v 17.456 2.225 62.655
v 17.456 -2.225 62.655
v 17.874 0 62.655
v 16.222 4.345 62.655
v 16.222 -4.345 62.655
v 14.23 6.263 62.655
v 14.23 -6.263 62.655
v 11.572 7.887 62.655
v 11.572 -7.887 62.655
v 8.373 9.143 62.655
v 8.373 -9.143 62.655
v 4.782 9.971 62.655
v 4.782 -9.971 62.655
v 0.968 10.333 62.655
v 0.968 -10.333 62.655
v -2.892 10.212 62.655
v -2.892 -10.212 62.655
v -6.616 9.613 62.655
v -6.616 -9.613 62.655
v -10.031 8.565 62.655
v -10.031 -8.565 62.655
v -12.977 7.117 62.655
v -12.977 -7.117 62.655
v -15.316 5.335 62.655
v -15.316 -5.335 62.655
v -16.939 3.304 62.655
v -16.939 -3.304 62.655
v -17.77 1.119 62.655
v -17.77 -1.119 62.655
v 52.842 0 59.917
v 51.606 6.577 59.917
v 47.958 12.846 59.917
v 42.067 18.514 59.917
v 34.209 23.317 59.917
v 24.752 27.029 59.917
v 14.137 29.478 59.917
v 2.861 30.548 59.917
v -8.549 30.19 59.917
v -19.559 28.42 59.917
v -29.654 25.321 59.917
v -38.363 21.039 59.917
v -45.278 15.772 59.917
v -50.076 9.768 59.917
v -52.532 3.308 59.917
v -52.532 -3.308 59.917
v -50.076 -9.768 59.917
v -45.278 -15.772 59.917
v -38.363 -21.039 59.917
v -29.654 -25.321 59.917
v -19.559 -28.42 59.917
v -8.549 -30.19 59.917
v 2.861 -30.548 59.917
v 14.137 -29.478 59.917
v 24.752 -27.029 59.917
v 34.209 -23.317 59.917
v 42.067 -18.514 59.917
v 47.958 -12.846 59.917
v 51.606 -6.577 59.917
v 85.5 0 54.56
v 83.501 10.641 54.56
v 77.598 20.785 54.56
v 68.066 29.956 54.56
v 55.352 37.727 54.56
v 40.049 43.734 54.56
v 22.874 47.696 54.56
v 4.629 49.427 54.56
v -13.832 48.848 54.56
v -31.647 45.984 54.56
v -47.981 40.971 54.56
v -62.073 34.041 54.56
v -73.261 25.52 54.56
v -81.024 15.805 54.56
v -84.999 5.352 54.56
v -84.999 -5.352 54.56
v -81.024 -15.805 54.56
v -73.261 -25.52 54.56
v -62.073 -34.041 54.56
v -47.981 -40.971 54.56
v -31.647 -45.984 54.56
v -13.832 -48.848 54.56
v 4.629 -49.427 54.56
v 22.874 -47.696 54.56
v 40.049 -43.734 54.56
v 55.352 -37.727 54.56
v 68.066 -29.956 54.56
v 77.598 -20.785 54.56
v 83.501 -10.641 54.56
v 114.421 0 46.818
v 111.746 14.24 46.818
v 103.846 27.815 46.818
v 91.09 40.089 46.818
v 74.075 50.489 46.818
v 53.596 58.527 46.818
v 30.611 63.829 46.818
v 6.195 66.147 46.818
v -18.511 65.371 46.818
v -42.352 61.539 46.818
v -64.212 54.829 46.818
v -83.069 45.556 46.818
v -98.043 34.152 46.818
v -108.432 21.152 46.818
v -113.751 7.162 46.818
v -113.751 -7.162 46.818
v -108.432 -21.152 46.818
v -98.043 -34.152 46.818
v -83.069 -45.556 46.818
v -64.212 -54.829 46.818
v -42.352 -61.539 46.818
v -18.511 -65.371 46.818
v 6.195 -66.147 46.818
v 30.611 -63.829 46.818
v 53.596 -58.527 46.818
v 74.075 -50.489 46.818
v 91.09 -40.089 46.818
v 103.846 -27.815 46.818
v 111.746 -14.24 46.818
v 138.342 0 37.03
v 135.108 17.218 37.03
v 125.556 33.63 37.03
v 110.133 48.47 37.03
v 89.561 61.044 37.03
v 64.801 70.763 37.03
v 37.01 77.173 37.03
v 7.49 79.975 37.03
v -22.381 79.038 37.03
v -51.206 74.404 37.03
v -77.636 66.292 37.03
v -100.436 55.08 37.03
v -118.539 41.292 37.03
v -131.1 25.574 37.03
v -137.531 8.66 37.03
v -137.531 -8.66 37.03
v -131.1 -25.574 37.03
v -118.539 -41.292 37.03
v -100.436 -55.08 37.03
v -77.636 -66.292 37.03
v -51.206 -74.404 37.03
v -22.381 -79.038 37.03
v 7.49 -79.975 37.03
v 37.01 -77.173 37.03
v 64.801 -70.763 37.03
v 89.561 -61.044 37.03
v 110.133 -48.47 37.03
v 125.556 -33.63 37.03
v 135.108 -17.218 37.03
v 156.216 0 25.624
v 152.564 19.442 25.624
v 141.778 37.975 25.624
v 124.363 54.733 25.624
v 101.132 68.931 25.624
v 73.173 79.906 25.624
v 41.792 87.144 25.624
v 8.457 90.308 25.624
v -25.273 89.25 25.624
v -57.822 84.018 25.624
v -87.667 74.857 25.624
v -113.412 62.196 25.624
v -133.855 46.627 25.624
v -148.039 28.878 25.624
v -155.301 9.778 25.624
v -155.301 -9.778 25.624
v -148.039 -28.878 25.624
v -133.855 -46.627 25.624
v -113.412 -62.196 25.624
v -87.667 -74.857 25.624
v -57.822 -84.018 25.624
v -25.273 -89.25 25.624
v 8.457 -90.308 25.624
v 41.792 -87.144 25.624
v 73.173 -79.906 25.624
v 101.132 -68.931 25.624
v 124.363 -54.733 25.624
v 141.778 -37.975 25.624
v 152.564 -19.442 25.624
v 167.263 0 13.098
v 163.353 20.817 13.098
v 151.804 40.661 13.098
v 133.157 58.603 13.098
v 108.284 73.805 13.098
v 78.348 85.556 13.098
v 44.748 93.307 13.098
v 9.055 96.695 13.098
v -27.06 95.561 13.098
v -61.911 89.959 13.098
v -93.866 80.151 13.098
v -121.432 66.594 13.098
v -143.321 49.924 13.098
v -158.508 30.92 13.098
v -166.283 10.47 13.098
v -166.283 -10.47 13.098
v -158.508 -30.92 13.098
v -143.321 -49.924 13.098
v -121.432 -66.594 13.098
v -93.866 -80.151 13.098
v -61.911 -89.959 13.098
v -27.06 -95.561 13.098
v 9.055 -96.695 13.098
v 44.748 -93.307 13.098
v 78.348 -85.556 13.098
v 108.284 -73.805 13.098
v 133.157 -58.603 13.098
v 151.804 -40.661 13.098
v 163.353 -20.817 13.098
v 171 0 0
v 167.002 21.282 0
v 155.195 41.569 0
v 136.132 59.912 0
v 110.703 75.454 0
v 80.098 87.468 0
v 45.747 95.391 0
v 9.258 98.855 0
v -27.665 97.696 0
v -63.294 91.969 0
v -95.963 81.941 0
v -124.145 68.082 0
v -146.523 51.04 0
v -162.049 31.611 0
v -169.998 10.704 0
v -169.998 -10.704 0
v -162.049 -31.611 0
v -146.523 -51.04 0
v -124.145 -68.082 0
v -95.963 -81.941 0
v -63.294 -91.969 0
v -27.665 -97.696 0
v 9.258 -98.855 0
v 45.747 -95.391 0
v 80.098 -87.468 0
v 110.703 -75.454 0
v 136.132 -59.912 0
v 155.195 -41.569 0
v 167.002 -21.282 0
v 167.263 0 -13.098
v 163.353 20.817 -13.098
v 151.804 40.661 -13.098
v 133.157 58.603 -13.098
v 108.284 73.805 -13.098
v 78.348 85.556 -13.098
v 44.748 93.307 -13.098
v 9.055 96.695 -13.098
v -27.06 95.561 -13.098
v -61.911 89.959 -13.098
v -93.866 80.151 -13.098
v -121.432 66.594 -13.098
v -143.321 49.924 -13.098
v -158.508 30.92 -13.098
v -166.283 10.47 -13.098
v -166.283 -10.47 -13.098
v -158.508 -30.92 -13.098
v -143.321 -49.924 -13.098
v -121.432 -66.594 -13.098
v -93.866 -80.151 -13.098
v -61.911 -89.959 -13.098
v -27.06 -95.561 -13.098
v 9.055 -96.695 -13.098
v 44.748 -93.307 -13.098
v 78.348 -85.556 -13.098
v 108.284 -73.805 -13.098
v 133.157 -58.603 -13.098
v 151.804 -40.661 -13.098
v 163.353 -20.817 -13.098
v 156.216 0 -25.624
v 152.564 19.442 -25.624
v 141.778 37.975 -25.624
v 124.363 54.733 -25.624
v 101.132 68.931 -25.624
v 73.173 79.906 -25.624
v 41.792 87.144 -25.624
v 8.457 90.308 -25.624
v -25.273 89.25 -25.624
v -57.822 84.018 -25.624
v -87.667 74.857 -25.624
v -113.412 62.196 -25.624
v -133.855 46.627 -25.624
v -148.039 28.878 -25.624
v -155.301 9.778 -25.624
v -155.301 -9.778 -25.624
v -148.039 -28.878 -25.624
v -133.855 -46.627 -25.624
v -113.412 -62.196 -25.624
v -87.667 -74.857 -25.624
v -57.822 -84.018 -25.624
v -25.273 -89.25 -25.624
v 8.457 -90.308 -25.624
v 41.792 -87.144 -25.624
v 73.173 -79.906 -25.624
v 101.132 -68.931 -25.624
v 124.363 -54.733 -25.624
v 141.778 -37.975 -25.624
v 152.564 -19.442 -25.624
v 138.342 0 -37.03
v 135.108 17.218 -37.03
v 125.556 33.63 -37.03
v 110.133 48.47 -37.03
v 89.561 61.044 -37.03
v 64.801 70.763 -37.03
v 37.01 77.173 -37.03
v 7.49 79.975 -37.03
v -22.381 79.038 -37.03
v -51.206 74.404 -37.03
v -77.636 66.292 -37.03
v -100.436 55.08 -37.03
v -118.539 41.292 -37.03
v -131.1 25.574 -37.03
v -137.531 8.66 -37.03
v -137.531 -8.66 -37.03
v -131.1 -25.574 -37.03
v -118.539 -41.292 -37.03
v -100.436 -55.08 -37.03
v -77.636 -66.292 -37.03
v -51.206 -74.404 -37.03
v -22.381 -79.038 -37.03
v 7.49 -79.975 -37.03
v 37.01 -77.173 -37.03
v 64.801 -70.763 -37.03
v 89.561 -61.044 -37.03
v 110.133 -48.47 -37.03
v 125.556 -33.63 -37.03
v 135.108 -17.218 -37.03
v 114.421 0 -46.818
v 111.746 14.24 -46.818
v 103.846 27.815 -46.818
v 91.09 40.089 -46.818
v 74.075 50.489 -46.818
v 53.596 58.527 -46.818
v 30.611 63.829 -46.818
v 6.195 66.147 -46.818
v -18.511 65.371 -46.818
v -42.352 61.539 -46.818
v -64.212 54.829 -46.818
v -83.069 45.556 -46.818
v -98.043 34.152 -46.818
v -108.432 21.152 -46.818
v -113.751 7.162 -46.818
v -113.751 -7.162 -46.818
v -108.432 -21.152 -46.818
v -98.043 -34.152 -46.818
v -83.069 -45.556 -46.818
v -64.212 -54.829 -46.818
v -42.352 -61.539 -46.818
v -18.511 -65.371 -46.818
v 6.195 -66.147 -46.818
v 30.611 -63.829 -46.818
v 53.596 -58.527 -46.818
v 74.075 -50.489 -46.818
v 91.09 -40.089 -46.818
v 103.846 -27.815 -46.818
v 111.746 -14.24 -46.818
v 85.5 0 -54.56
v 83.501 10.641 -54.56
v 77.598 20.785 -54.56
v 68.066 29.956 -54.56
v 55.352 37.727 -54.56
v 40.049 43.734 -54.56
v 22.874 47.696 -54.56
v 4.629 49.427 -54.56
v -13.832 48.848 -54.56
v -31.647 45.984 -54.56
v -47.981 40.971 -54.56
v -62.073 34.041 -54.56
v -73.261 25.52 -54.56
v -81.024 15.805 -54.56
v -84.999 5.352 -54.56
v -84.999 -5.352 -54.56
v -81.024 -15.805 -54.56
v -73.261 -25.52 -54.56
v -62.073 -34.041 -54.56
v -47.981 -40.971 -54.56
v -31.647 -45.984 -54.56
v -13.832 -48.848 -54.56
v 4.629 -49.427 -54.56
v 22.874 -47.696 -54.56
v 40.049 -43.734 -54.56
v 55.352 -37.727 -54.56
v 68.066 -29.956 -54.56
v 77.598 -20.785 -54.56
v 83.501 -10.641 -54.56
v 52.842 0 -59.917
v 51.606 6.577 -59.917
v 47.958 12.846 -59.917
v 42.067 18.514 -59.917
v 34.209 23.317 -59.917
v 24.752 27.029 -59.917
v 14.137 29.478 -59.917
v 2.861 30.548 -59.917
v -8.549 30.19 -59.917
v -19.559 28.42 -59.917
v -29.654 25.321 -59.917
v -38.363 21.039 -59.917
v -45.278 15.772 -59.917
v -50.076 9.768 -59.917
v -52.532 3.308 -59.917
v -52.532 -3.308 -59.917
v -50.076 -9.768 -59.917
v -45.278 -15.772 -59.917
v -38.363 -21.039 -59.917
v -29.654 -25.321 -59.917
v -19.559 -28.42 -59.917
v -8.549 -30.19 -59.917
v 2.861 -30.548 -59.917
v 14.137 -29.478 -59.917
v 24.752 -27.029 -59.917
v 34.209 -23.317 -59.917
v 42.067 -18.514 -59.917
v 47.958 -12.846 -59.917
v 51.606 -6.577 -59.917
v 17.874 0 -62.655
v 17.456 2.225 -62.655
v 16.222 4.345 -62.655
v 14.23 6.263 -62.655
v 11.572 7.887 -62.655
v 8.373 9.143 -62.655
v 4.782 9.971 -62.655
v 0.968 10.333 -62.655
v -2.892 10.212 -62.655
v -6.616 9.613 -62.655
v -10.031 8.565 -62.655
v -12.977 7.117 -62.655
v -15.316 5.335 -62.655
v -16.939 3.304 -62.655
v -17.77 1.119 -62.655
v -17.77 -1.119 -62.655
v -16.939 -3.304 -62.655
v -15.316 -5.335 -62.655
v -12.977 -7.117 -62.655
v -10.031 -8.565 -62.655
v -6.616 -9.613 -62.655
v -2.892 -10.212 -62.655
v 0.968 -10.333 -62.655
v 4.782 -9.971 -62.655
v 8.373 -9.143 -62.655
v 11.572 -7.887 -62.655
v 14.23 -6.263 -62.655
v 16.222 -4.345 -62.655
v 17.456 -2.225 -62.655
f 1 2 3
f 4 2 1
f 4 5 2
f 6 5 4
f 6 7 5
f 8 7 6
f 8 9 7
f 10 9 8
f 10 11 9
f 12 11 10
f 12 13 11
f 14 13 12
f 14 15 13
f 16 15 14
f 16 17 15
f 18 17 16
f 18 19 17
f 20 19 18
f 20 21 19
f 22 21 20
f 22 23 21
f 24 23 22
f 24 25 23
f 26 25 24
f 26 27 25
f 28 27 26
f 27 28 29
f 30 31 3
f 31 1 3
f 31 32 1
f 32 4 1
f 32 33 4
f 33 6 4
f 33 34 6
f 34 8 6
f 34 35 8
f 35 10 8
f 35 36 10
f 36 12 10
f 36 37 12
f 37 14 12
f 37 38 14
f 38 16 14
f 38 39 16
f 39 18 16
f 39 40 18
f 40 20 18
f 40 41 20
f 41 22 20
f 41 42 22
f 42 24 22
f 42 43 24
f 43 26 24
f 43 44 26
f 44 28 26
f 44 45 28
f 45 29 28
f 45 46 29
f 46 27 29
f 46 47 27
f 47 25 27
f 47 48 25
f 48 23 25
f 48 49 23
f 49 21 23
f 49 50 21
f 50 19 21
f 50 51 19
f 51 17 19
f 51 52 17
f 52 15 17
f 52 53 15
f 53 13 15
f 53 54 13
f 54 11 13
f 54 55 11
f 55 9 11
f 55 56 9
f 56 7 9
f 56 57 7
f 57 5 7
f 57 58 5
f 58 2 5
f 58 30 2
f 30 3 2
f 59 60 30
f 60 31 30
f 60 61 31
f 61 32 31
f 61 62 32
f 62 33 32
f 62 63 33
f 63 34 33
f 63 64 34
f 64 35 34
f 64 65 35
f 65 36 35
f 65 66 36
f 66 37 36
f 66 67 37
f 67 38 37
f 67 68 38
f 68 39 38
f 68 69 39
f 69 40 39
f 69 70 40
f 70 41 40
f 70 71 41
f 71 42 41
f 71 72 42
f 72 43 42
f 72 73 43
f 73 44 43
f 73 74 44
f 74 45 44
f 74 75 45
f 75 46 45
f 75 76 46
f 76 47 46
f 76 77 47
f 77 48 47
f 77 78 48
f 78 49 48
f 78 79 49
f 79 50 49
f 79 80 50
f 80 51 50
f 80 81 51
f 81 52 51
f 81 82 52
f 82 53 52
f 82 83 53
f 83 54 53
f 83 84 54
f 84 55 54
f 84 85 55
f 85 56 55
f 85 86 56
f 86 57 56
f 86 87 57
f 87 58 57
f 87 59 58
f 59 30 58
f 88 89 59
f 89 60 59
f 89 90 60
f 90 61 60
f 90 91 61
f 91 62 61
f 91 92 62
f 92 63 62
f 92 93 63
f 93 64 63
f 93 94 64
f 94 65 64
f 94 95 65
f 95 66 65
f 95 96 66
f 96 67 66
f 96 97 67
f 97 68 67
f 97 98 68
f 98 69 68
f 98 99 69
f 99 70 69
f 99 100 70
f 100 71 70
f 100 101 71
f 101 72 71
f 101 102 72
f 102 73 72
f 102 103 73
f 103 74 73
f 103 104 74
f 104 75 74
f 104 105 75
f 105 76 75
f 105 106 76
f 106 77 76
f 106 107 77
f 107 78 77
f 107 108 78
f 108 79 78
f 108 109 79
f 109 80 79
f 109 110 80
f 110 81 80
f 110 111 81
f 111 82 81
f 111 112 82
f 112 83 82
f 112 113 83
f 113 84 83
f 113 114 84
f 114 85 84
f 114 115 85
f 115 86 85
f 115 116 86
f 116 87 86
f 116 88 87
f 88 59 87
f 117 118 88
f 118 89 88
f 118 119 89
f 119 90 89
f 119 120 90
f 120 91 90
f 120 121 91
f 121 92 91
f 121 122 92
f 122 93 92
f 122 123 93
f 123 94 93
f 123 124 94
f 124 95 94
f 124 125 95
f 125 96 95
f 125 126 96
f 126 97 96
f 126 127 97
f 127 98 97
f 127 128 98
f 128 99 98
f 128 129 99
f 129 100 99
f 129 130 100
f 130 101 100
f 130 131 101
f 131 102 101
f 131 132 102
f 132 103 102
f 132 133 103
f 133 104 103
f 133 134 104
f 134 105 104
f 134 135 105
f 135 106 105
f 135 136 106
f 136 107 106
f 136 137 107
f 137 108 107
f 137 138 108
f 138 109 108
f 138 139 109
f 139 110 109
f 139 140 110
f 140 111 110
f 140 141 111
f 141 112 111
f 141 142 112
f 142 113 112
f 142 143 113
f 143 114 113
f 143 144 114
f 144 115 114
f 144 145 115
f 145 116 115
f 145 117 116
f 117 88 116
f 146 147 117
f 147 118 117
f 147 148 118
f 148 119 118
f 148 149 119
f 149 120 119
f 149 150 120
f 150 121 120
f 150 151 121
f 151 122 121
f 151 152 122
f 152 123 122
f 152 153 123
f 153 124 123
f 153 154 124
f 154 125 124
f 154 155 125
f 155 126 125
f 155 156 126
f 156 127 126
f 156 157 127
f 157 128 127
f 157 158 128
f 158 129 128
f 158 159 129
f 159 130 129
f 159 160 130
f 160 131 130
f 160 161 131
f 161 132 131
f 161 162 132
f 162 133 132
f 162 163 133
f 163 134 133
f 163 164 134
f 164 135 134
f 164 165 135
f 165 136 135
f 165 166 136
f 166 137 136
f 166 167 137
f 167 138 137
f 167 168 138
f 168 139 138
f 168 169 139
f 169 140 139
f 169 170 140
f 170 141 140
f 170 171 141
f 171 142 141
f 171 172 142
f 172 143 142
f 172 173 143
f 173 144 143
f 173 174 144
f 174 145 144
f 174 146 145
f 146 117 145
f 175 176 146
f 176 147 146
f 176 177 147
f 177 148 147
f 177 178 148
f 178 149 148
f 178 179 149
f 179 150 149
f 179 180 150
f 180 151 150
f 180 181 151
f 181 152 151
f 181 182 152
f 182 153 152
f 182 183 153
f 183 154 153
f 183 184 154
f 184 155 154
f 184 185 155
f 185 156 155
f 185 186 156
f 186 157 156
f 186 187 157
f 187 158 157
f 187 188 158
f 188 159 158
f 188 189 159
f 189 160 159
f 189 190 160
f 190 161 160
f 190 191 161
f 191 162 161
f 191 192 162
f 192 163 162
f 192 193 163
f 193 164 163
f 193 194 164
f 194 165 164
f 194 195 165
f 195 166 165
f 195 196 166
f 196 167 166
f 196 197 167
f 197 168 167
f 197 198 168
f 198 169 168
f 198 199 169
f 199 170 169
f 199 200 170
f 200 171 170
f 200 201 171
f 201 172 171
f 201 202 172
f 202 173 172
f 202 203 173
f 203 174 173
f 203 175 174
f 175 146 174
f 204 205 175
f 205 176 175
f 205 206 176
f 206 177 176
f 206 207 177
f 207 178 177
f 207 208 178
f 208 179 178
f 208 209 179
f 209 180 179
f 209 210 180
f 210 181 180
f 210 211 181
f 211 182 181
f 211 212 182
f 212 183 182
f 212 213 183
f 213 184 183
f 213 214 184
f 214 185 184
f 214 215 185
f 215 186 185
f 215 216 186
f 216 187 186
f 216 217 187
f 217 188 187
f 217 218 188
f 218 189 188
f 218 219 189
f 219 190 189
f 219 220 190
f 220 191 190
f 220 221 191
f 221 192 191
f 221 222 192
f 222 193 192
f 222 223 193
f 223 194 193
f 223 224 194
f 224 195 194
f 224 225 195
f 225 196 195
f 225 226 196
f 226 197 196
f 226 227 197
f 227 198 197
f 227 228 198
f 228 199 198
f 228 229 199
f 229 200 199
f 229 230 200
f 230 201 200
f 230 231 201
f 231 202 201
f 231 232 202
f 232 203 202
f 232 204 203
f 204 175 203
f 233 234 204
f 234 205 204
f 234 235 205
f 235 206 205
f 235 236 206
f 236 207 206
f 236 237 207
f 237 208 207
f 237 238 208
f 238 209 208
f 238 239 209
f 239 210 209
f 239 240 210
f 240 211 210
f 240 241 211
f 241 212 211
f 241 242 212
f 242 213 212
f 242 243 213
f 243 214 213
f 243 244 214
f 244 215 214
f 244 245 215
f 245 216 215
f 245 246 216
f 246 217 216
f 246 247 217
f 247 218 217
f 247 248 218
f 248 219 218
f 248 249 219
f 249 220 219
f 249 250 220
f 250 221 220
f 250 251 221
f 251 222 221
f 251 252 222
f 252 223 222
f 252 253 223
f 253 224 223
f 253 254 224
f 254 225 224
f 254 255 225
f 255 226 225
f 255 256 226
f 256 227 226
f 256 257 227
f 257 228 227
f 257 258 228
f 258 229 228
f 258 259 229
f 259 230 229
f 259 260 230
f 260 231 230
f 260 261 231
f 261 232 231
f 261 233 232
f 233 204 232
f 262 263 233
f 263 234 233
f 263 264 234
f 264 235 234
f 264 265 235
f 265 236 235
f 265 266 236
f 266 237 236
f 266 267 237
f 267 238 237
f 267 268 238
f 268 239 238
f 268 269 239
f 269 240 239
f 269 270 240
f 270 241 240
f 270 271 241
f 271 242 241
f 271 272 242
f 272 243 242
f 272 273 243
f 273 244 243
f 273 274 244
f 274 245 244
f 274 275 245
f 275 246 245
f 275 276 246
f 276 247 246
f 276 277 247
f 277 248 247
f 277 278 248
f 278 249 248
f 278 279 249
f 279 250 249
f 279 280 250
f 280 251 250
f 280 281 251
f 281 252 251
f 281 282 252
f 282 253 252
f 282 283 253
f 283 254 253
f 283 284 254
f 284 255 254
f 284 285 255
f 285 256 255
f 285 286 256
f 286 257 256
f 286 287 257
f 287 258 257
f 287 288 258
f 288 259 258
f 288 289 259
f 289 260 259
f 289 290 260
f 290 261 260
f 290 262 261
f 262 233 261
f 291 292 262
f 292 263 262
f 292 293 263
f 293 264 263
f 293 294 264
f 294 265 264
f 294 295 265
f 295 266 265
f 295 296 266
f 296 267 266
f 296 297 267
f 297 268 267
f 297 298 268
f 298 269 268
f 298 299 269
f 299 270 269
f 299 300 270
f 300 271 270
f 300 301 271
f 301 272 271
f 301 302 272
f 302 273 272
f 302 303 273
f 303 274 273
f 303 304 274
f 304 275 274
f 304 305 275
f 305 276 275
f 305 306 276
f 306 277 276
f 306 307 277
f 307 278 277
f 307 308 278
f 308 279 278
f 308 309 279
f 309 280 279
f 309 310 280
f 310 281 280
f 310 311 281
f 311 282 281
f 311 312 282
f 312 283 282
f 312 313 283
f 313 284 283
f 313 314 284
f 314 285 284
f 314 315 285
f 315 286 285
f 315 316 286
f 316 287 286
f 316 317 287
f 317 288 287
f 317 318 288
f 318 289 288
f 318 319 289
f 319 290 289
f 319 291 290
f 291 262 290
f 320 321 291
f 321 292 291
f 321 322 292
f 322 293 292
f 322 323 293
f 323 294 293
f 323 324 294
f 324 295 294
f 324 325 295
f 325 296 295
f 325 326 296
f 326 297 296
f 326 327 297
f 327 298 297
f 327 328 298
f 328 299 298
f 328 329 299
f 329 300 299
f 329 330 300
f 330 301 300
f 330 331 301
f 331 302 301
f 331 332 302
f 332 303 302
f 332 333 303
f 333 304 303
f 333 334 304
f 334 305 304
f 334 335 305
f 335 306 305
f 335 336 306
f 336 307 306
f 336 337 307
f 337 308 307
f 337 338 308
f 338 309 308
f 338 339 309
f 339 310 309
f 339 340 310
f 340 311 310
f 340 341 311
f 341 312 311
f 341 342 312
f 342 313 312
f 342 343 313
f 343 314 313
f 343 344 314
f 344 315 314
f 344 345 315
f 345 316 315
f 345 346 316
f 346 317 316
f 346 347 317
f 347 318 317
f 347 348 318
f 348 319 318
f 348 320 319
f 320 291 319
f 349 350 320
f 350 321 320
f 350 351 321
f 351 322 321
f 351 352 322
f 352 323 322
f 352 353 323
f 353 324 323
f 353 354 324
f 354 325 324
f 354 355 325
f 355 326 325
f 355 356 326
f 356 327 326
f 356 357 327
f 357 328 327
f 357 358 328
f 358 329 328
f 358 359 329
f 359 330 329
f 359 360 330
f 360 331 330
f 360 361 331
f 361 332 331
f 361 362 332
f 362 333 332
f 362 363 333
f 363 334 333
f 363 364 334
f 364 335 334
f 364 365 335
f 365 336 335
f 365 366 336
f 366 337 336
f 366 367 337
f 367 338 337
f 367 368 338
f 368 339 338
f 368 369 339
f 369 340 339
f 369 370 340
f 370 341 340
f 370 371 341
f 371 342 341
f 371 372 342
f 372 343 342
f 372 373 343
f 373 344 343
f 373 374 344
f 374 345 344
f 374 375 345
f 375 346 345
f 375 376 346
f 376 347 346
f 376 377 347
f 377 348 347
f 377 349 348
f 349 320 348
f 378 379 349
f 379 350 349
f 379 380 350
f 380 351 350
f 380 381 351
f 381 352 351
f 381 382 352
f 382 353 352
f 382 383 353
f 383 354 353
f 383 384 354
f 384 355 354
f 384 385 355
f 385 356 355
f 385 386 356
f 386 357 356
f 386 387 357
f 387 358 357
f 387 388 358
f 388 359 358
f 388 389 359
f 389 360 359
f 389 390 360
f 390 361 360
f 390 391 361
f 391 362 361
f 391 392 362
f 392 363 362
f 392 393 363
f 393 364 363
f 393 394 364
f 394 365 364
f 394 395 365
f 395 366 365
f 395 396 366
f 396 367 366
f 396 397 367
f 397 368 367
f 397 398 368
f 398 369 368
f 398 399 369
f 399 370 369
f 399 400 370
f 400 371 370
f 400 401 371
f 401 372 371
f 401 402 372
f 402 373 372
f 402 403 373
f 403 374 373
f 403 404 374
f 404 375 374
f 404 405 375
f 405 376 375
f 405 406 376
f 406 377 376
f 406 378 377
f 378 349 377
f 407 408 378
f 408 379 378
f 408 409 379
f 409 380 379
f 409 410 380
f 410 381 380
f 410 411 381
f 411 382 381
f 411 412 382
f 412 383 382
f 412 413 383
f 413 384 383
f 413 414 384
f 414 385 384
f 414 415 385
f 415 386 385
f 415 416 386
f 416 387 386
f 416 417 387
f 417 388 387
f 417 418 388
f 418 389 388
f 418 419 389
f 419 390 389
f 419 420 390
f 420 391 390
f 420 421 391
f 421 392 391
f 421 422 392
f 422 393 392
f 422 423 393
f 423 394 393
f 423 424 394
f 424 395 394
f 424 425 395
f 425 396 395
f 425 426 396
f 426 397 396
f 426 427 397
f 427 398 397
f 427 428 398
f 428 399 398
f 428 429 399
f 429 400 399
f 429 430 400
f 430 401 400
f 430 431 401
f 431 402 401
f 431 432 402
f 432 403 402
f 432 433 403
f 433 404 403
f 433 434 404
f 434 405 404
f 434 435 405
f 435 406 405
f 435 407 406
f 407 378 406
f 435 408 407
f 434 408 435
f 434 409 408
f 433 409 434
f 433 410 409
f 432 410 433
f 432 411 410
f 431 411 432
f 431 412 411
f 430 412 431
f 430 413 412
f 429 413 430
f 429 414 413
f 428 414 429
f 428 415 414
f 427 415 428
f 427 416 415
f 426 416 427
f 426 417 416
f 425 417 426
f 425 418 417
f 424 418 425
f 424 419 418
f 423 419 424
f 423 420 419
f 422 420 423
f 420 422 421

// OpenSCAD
// Generated by SolidPython 1.0.1 on 2020-07-29 00:46:54


scale(v = [19, 11, 7]) {
	sphere(r = 9);
}
/***********************************************
*********      SolidPython code:      **********
************************************************
 
# import packages: SolidPython
from solid import *
from solid.utils import *
from itertools import chain, combinations, permutations


class Resize:

    def __init__(self, scad_file):
        self.scad_file = scad_file
        #self.scad_file = import_scad(scad_file)
        # cone/cylinder param:
        self.r1 = 0
        self.r2 = 0
        self.h = 0
        # rectangular prism param:
        self.w = 0
        self.l = 0
        # ellipse param:
        self.r = 0

    # import OpenScad code (file name corresponds to shape)


    # classify shape + parameters
    def assign(self, param1, param2, param3):
        if self.scad_file == 'cone.scad':
            self.r1 = param1
            self.r2 = param2
            self.h = param3
        elif self.scad_file == 'cylinder.scad':
            self.r1 = param1
            self.r2 = param2
            self.h = param3
        elif self.scad_file == 'rectangularPrism.scad':
            self.h = param1
            self.l = param2
            self.w = param3
        else:
            self.r = param1
            self.h = param2

    # resize parameters
    def iterate(self):
        x = range(3, 20, 2)
        i = 1
        if self.scad_file == 'cone.scad':
            tempList = list(permutations(x, 2))
            for temp in tempList:
                param1 = temp[0]
                param2 = temp[1]
                filepath = 'produced_scad_files/' + 'cone' + str(param1) + '_' + str(param2) + '_' + '.scad'
                scad_render_to_file(cylinder(h=param1, r1=param2, r2=0), filepath)

        elif self.scad_file == 'cylinder.scad':
            tempList = list(permutations(x, 3))
            for temp in tempList:
                param1 = temp[0]
                param2 = temp[1]
                filepath = 'produced_scad_files/' + 'cylinder' + str(param1) + '_' + str(param2) + '_' + '.scad'
                scad_render_to_file(cylinder(h=param1, r1=param2, r2=param2), filepath)

        elif self.scad_file == 'rectangularPrism.scad':
            tempList = list(permutations(x, 3))
            for temp in tempList:
                param1 = temp[0]
                param2 = temp[1]
                param3 = temp[2]
                filepath = 'produced_scad_files/' + 'rectangularPrism' + str(param1) + '_' + str(param2) + '_' + str(
                    param3) + '.scad'
                scad_render_to_file(cube(size=(param1, param2, param3)), filepath)

        elif self.scad_file == 'ellipse.scad':
            tempList = list(permutations(x, 4))
            for temp in tempList:
                param1 = temp[0]
                param2 = temp[1]
                param3 = temp[2]
                param4 = temp[3]
                filepath = 'produced_scad_files/' + 'ellipse' + str(param1) + '_' + str(param2) + '_' + str(param3) + '_' + str(param4) + '.scad'
                scad_render_to_file(scale([param1, param2, param3])(sphere(r=param4)), filepath)

    def render_to_scadfile(self):
        scad_render_to_file(scad, 'example.scad') 
 
************************************************/
